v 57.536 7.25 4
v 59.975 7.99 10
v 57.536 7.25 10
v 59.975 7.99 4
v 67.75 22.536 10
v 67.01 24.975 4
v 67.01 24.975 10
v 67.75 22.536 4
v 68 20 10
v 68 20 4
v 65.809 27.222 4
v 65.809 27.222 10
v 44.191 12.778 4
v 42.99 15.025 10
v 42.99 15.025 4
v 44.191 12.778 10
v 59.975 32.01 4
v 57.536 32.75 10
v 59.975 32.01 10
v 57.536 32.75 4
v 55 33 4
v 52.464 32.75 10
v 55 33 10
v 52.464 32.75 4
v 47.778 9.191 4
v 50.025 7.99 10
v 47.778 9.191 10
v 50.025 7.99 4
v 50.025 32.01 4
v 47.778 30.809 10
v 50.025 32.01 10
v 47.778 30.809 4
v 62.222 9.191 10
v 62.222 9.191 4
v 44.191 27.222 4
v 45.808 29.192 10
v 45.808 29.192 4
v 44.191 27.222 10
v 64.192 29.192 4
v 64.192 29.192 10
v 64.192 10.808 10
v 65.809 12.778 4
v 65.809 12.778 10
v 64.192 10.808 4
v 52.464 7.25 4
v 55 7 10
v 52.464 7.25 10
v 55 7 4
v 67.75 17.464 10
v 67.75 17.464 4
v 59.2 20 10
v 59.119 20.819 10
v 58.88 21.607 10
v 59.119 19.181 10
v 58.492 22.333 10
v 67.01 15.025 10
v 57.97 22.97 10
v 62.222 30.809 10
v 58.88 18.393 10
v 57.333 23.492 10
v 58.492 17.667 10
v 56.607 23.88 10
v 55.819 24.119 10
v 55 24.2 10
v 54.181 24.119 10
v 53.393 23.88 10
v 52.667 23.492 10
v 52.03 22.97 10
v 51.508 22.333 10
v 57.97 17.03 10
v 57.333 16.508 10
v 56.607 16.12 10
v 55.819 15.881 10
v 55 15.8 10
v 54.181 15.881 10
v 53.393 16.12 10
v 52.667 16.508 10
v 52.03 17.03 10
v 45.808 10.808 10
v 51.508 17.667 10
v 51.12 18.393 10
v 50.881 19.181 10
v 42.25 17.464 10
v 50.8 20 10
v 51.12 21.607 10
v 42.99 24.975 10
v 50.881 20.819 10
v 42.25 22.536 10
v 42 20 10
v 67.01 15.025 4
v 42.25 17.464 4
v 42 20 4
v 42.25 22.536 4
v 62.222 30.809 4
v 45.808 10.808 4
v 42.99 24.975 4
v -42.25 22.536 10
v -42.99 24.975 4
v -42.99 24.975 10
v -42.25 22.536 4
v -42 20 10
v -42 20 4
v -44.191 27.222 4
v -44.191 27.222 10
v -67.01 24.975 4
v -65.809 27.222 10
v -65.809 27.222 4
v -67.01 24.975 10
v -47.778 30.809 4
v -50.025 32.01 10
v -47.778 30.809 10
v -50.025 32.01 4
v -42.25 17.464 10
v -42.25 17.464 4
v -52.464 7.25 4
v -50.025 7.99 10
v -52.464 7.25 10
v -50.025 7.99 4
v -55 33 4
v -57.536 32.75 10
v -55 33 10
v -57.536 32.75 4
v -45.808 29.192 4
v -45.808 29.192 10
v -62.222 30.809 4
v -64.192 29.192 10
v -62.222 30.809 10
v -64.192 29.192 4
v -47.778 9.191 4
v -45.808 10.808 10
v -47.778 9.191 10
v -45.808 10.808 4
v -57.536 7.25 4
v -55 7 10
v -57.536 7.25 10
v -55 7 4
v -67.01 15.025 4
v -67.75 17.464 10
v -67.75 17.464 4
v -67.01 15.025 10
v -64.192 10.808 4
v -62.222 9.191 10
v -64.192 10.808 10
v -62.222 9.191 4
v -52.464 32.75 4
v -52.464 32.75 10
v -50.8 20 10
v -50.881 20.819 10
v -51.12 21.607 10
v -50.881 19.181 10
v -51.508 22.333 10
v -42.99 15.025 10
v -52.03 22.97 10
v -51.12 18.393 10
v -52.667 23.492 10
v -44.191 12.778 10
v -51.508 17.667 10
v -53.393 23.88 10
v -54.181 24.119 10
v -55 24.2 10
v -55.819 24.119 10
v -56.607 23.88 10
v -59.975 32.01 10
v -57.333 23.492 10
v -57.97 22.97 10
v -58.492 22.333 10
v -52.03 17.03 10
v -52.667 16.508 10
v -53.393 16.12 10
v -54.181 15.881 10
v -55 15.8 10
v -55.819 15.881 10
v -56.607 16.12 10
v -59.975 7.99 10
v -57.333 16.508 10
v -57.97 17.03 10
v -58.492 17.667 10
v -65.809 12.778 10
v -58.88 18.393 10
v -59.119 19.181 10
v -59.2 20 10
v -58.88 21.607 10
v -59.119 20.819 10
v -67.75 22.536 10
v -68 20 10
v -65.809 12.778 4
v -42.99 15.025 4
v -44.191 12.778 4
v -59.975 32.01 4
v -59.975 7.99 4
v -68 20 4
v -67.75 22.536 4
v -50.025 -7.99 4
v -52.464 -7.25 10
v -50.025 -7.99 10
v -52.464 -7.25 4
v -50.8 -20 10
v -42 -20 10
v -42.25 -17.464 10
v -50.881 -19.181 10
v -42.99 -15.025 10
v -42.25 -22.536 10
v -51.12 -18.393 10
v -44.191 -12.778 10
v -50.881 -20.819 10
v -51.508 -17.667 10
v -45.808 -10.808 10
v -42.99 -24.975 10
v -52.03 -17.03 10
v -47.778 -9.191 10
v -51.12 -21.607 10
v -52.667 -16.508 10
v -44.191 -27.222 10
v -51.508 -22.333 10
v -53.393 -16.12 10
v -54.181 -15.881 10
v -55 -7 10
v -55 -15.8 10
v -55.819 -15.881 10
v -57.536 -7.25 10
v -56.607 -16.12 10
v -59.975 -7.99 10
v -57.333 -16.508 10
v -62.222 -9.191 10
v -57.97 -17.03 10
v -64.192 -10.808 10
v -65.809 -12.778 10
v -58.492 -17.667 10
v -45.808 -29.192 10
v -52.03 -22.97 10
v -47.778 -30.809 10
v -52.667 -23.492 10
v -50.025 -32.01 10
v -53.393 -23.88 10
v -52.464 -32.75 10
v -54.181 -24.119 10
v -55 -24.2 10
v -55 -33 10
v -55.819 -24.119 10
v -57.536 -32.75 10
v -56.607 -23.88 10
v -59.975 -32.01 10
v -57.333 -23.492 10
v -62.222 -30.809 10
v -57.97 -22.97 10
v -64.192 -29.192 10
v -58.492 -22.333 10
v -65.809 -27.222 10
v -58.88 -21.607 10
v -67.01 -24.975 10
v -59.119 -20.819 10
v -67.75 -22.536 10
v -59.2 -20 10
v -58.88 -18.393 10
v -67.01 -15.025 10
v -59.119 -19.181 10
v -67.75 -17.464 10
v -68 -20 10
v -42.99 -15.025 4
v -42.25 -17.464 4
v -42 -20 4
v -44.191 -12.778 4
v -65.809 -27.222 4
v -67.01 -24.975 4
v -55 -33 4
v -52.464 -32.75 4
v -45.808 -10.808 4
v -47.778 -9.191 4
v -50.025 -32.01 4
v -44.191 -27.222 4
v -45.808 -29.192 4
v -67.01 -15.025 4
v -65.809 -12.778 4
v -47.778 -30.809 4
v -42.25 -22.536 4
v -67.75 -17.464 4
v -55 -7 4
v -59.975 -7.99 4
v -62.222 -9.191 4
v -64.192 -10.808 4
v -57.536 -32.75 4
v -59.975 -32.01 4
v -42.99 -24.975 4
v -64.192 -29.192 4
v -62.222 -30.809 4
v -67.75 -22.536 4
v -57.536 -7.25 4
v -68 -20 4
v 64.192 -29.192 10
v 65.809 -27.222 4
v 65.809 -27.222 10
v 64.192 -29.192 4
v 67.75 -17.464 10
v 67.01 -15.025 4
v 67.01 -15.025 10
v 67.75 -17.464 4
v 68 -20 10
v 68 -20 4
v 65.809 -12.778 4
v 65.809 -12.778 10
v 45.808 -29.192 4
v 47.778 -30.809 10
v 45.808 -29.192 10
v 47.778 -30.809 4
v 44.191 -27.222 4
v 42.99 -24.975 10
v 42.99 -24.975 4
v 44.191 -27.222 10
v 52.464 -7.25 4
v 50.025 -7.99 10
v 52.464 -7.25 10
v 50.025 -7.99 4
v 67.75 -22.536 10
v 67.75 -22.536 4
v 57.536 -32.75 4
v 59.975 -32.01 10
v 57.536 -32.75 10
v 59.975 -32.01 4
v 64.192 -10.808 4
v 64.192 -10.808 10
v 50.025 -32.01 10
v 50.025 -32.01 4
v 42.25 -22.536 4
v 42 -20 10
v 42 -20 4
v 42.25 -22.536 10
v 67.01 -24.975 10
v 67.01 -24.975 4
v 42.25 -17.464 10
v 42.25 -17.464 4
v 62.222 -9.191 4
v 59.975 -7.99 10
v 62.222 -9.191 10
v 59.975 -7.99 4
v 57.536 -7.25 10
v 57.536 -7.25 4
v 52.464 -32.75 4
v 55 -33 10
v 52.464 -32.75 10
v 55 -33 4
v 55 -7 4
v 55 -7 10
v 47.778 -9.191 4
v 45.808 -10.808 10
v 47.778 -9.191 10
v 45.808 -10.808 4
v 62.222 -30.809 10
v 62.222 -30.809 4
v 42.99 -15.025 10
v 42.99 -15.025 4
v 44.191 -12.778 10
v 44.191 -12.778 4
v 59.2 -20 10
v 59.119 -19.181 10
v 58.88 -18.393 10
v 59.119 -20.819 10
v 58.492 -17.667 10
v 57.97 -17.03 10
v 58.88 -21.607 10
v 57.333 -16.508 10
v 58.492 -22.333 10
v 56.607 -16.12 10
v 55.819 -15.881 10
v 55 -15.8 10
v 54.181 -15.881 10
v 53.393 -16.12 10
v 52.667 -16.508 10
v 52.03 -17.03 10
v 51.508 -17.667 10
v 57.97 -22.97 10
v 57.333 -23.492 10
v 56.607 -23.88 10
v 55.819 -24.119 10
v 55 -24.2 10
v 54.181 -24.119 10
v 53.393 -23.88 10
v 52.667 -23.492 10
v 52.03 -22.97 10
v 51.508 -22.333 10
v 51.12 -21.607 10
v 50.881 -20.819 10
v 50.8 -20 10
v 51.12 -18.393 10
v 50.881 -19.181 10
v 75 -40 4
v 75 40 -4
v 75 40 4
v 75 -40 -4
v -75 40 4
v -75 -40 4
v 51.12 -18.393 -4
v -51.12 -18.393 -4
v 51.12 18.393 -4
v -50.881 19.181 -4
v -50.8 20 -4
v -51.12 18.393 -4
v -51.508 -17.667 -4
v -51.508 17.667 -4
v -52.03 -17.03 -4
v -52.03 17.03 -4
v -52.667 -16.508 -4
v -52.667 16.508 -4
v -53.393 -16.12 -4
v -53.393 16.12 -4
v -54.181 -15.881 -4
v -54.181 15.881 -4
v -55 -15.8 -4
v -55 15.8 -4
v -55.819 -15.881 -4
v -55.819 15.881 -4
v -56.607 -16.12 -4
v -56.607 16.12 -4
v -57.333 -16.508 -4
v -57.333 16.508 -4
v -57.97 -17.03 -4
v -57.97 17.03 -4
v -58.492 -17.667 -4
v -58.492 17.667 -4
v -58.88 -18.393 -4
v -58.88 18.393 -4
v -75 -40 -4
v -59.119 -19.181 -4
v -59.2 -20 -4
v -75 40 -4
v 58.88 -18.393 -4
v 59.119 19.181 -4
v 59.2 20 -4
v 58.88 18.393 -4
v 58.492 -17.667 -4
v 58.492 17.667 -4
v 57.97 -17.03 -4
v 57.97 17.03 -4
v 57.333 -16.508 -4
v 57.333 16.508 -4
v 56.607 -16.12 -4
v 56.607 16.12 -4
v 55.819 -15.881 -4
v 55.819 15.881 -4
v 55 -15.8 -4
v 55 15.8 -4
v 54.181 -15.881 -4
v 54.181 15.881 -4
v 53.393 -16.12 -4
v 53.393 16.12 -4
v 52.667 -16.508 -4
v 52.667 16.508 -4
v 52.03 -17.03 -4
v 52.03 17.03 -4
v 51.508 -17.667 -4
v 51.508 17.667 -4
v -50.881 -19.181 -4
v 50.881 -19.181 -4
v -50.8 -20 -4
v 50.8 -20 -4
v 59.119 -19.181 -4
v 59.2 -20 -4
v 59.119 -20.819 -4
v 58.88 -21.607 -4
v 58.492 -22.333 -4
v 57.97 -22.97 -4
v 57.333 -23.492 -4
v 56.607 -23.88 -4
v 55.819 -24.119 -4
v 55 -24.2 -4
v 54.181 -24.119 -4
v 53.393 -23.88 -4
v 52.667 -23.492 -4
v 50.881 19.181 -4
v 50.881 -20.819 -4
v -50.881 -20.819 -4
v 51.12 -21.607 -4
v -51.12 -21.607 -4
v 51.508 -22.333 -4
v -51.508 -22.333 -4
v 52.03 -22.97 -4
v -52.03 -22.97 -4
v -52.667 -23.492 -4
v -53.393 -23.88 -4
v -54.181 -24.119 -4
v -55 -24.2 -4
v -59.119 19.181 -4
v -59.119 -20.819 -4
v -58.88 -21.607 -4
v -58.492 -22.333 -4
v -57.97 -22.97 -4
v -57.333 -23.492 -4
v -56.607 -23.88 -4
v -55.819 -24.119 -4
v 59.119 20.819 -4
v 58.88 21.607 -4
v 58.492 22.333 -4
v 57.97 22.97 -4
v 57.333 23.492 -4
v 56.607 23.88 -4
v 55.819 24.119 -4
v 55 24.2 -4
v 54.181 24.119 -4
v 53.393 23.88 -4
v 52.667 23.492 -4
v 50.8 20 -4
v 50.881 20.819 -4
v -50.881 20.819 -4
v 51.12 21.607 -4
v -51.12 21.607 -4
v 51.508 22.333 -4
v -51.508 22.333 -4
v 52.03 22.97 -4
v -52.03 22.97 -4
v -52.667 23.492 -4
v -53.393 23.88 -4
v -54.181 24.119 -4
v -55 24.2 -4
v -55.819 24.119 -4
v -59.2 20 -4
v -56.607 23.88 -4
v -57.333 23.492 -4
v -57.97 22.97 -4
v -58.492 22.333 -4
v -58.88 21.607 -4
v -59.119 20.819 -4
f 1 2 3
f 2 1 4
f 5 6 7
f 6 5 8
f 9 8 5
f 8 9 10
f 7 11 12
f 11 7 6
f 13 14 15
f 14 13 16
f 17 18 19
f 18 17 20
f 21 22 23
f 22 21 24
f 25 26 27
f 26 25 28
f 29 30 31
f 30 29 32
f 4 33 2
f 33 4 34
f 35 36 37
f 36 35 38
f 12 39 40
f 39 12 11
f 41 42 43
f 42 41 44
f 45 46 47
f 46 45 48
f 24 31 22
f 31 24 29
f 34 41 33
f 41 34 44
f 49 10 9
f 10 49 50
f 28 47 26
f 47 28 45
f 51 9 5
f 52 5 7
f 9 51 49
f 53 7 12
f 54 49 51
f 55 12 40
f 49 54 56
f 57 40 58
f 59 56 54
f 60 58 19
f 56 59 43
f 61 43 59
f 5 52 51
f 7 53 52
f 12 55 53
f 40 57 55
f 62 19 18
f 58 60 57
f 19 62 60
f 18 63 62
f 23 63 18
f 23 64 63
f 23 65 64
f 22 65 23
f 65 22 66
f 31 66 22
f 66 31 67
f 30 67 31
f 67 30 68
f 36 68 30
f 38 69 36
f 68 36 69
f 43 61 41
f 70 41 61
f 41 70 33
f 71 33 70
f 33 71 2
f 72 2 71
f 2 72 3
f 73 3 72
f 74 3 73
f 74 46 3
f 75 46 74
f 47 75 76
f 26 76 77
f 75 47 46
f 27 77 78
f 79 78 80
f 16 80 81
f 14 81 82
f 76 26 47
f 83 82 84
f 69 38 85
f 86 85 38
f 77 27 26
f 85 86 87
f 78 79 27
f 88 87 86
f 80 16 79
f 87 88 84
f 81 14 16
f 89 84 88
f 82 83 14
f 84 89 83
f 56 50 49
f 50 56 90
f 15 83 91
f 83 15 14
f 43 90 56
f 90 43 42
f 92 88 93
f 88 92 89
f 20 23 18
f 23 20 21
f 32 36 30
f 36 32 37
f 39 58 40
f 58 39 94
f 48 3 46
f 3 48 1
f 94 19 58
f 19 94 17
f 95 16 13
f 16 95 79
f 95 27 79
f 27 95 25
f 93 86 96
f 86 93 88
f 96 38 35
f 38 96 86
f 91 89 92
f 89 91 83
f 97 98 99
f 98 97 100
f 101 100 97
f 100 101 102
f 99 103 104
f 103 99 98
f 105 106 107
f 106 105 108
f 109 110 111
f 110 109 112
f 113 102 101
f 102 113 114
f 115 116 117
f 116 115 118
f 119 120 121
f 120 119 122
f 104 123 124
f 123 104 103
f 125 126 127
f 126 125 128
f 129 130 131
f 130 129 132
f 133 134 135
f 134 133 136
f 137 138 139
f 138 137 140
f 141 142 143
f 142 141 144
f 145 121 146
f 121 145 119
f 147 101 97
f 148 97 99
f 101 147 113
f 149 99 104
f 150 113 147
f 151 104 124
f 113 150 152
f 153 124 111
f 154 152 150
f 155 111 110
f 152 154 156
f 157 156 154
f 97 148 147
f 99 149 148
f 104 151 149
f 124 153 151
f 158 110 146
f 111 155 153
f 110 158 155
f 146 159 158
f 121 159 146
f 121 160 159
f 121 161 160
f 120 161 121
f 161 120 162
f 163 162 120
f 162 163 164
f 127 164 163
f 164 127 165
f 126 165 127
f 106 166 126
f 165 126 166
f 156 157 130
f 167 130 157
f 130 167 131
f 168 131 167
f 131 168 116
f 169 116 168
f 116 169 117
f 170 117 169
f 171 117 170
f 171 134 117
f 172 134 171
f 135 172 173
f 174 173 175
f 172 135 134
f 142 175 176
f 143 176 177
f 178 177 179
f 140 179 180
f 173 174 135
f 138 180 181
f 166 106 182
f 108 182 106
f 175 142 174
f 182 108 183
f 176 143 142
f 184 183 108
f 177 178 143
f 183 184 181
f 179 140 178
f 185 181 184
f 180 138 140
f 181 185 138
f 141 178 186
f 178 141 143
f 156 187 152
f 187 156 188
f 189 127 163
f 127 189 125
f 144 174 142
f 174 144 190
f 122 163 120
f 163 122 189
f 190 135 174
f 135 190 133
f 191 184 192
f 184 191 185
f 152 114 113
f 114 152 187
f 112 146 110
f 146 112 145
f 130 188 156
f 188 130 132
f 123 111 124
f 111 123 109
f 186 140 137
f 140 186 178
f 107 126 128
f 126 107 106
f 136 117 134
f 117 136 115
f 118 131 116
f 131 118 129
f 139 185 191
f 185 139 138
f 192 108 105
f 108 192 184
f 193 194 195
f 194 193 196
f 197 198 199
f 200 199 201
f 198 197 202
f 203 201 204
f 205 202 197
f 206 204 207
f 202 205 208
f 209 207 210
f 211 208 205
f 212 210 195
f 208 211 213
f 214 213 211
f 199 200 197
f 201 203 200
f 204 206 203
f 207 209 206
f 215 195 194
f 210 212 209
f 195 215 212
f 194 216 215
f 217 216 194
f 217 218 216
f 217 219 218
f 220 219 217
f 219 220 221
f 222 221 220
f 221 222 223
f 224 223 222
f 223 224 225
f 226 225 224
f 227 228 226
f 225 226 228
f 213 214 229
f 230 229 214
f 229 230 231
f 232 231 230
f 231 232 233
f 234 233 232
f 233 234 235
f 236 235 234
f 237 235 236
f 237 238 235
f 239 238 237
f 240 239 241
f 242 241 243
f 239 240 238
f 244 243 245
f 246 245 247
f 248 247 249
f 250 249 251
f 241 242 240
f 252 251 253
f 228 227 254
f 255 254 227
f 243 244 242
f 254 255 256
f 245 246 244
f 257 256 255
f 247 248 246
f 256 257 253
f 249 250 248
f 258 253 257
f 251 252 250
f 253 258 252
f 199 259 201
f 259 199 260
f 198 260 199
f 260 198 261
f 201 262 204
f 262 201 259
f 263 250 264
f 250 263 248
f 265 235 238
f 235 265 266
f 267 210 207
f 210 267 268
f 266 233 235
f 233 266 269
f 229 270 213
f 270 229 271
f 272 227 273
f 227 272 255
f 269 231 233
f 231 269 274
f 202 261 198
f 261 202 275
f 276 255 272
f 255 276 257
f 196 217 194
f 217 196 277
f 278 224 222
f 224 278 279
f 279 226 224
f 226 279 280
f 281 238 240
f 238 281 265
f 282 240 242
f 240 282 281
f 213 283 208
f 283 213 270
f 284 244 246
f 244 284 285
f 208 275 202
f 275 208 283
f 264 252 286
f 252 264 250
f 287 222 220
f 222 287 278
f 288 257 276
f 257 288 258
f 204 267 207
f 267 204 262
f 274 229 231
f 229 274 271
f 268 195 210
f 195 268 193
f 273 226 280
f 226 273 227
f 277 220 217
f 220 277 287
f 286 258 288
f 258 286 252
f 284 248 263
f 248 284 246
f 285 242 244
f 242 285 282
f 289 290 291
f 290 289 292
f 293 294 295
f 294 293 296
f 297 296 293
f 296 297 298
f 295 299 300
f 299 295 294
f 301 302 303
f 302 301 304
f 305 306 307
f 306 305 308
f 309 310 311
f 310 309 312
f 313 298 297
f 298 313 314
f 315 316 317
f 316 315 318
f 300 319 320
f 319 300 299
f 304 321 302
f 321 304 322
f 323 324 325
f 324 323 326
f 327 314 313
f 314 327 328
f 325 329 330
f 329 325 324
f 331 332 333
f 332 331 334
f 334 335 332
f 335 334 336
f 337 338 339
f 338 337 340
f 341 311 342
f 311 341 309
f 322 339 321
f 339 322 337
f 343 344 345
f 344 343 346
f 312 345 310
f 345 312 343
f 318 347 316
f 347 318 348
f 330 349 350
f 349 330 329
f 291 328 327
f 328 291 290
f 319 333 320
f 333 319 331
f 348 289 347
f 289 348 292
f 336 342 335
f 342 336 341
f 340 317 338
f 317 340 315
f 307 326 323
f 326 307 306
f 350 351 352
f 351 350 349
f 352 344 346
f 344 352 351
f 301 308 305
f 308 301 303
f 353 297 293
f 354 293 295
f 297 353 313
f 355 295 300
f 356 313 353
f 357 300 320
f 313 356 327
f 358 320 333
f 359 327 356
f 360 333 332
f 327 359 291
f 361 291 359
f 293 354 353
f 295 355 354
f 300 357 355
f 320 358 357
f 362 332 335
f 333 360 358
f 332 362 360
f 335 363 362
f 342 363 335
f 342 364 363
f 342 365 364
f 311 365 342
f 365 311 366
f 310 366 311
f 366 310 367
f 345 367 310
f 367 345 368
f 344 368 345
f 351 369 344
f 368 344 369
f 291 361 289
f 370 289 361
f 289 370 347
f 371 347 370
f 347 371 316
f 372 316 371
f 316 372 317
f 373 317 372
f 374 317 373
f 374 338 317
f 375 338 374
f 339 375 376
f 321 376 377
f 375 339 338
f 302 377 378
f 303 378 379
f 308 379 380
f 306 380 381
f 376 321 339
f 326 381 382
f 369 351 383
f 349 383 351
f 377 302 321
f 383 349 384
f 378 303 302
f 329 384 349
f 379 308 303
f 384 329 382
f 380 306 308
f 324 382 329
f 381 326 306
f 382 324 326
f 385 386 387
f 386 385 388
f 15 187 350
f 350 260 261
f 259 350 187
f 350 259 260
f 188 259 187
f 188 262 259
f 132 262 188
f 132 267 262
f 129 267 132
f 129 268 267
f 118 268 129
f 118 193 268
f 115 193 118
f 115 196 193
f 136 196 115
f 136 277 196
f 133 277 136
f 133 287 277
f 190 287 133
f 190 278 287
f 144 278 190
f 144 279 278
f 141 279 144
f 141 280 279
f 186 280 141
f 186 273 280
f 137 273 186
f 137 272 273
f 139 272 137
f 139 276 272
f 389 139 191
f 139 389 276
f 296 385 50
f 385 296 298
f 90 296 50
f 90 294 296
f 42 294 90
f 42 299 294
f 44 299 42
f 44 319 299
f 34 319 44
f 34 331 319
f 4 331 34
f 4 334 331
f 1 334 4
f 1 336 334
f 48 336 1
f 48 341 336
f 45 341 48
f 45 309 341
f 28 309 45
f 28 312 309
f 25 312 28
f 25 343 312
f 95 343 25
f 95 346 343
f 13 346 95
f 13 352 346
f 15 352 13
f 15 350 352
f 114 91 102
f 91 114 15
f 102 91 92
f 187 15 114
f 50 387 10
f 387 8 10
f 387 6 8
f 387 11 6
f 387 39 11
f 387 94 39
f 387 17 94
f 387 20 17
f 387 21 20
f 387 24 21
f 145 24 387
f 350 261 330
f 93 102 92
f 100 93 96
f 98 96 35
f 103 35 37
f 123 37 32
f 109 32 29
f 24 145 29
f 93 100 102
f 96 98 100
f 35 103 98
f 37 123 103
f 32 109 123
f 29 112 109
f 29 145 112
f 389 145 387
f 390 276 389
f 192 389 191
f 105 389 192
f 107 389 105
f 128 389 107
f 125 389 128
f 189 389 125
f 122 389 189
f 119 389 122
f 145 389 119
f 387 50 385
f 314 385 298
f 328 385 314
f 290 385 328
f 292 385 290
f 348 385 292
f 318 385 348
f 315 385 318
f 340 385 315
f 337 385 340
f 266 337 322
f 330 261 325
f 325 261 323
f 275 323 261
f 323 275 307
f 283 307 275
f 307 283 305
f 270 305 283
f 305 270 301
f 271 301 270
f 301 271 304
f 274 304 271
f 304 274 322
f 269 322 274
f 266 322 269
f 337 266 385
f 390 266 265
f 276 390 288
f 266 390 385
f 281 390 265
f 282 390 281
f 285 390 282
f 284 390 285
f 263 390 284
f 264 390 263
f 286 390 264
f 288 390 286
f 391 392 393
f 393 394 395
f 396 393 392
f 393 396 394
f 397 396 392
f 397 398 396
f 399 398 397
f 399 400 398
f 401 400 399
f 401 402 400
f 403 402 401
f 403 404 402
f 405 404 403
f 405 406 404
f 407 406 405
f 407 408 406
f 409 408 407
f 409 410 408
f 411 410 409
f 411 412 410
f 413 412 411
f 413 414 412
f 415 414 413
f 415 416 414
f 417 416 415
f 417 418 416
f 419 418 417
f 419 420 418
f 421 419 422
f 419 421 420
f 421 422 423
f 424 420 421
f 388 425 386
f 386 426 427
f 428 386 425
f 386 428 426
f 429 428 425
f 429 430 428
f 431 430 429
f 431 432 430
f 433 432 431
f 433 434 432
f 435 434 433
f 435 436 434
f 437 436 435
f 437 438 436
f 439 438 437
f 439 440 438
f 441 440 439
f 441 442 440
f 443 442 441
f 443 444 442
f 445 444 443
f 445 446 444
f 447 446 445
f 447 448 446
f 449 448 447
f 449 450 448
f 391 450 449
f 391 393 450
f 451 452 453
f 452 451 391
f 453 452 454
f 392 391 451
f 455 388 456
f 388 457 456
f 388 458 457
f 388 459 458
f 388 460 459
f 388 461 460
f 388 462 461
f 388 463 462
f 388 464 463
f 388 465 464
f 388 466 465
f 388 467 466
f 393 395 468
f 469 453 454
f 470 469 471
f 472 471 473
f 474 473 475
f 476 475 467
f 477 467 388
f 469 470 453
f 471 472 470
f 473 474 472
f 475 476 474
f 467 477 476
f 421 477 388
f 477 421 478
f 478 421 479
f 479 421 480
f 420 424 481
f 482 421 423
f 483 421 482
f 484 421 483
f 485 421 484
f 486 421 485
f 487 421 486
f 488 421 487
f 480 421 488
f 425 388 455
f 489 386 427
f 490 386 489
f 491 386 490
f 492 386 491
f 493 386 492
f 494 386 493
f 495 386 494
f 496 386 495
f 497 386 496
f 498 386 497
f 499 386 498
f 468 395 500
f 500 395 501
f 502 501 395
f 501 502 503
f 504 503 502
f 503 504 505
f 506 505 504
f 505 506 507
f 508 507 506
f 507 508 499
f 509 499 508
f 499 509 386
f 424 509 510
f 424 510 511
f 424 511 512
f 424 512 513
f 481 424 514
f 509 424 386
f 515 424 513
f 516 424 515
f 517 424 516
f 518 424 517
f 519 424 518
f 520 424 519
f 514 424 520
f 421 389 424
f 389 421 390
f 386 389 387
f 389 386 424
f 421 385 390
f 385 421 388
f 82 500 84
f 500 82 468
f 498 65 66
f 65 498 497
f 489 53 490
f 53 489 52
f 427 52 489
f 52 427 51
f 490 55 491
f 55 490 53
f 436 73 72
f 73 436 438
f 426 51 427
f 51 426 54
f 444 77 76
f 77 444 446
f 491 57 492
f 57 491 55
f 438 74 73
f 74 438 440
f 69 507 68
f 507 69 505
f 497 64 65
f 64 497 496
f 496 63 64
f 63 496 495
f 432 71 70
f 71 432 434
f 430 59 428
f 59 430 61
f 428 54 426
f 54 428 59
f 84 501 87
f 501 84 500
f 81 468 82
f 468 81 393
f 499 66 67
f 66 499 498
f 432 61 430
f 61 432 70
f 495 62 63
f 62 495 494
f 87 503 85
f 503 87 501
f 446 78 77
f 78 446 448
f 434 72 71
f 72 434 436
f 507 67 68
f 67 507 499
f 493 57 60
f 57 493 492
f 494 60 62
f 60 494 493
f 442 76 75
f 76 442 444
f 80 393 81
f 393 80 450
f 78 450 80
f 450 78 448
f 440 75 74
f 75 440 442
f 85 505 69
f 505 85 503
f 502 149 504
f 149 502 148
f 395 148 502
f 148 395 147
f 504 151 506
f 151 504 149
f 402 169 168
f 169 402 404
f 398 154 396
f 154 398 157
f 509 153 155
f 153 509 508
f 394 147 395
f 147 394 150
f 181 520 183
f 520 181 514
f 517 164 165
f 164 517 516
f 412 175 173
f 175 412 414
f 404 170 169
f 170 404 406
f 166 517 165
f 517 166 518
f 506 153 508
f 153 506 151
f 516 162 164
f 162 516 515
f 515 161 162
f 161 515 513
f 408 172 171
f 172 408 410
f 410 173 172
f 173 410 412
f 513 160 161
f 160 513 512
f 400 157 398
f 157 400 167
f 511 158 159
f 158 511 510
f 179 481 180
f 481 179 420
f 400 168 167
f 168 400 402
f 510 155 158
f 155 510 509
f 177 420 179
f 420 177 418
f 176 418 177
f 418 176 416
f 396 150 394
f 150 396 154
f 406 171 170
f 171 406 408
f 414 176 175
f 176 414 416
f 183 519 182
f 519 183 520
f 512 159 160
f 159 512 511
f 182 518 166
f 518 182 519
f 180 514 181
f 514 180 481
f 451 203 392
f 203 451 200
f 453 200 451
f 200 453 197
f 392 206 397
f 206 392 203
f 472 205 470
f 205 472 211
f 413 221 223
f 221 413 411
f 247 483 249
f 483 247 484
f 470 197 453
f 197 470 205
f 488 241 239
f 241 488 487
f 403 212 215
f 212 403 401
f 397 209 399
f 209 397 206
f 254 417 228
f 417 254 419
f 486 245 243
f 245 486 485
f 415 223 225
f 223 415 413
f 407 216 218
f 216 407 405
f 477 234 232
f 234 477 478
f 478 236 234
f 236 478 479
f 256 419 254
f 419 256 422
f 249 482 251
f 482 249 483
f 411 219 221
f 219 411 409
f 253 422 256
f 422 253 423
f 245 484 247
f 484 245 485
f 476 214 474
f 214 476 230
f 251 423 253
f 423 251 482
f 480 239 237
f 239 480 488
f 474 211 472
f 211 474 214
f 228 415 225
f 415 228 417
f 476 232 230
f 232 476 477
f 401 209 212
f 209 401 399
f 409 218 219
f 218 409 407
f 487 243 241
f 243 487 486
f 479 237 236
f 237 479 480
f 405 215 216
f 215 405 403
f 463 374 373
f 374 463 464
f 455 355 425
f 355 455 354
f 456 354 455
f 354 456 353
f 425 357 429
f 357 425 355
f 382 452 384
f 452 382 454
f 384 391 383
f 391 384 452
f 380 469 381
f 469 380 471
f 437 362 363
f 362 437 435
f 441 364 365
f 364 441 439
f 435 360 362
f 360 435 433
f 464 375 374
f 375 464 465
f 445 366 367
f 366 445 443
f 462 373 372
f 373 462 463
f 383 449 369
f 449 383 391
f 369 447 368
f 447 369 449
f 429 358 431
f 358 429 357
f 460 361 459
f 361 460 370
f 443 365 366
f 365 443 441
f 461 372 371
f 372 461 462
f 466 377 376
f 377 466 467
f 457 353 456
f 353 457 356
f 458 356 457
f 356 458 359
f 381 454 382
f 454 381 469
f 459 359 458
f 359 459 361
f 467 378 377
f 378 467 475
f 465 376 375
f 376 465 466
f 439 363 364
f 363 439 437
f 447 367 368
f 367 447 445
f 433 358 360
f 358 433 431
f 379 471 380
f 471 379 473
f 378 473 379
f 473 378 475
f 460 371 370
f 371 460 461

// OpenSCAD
$fn = 32;

// ----------------------------------------------------------------------
// Anchor pads 150 x 80 x 14
// four corner bosses with anchor holes
// ----------------------------------------------------------------------

// --- parameters (mm) ---
plate = [150, 80, 8];  // base plate size (x, y, z)
pads = 4;              // boss count, one per corner
edge = 20;             // boss centre offset from the plate edge
boss_d = 26;           // boss diameter
boss_h = 6;            // boss height above the base plate
hole_d = 8.4;          // hole diameter

// --- derived feature positions (mm) ---
height = plate[2] + boss_h;      // = 14   overall height of the part
corner_x = plate[0] / 2 - edge;  // = 55   boss centre X
corner_y = plate[1] / 2 - edge;  // = 20   boss centre Y
feature_centers = [
  [corner_x, corner_y],
  [-corner_x, corner_y],
  [-corner_x, -corner_y],
  [corner_x, -corner_y]
];   // boss centres, anchor holes are drilled there

// base plate, four bosses standing on it, anchor holes all the way through
difference() {
  union() {
    cube(plate, center = true);
    for (centre = feature_centers)
      translate([centre[0], centre[1], plate[2] / 2 - 1])
        cylinder(d = boss_d, h = boss_h + 1);
  }
  for (centre = feature_centers)
    translate([centre[0], centre[1], -height])
      cylinder(d = hole_d, h = 2 * height + 2);  // through boss and plate
}
